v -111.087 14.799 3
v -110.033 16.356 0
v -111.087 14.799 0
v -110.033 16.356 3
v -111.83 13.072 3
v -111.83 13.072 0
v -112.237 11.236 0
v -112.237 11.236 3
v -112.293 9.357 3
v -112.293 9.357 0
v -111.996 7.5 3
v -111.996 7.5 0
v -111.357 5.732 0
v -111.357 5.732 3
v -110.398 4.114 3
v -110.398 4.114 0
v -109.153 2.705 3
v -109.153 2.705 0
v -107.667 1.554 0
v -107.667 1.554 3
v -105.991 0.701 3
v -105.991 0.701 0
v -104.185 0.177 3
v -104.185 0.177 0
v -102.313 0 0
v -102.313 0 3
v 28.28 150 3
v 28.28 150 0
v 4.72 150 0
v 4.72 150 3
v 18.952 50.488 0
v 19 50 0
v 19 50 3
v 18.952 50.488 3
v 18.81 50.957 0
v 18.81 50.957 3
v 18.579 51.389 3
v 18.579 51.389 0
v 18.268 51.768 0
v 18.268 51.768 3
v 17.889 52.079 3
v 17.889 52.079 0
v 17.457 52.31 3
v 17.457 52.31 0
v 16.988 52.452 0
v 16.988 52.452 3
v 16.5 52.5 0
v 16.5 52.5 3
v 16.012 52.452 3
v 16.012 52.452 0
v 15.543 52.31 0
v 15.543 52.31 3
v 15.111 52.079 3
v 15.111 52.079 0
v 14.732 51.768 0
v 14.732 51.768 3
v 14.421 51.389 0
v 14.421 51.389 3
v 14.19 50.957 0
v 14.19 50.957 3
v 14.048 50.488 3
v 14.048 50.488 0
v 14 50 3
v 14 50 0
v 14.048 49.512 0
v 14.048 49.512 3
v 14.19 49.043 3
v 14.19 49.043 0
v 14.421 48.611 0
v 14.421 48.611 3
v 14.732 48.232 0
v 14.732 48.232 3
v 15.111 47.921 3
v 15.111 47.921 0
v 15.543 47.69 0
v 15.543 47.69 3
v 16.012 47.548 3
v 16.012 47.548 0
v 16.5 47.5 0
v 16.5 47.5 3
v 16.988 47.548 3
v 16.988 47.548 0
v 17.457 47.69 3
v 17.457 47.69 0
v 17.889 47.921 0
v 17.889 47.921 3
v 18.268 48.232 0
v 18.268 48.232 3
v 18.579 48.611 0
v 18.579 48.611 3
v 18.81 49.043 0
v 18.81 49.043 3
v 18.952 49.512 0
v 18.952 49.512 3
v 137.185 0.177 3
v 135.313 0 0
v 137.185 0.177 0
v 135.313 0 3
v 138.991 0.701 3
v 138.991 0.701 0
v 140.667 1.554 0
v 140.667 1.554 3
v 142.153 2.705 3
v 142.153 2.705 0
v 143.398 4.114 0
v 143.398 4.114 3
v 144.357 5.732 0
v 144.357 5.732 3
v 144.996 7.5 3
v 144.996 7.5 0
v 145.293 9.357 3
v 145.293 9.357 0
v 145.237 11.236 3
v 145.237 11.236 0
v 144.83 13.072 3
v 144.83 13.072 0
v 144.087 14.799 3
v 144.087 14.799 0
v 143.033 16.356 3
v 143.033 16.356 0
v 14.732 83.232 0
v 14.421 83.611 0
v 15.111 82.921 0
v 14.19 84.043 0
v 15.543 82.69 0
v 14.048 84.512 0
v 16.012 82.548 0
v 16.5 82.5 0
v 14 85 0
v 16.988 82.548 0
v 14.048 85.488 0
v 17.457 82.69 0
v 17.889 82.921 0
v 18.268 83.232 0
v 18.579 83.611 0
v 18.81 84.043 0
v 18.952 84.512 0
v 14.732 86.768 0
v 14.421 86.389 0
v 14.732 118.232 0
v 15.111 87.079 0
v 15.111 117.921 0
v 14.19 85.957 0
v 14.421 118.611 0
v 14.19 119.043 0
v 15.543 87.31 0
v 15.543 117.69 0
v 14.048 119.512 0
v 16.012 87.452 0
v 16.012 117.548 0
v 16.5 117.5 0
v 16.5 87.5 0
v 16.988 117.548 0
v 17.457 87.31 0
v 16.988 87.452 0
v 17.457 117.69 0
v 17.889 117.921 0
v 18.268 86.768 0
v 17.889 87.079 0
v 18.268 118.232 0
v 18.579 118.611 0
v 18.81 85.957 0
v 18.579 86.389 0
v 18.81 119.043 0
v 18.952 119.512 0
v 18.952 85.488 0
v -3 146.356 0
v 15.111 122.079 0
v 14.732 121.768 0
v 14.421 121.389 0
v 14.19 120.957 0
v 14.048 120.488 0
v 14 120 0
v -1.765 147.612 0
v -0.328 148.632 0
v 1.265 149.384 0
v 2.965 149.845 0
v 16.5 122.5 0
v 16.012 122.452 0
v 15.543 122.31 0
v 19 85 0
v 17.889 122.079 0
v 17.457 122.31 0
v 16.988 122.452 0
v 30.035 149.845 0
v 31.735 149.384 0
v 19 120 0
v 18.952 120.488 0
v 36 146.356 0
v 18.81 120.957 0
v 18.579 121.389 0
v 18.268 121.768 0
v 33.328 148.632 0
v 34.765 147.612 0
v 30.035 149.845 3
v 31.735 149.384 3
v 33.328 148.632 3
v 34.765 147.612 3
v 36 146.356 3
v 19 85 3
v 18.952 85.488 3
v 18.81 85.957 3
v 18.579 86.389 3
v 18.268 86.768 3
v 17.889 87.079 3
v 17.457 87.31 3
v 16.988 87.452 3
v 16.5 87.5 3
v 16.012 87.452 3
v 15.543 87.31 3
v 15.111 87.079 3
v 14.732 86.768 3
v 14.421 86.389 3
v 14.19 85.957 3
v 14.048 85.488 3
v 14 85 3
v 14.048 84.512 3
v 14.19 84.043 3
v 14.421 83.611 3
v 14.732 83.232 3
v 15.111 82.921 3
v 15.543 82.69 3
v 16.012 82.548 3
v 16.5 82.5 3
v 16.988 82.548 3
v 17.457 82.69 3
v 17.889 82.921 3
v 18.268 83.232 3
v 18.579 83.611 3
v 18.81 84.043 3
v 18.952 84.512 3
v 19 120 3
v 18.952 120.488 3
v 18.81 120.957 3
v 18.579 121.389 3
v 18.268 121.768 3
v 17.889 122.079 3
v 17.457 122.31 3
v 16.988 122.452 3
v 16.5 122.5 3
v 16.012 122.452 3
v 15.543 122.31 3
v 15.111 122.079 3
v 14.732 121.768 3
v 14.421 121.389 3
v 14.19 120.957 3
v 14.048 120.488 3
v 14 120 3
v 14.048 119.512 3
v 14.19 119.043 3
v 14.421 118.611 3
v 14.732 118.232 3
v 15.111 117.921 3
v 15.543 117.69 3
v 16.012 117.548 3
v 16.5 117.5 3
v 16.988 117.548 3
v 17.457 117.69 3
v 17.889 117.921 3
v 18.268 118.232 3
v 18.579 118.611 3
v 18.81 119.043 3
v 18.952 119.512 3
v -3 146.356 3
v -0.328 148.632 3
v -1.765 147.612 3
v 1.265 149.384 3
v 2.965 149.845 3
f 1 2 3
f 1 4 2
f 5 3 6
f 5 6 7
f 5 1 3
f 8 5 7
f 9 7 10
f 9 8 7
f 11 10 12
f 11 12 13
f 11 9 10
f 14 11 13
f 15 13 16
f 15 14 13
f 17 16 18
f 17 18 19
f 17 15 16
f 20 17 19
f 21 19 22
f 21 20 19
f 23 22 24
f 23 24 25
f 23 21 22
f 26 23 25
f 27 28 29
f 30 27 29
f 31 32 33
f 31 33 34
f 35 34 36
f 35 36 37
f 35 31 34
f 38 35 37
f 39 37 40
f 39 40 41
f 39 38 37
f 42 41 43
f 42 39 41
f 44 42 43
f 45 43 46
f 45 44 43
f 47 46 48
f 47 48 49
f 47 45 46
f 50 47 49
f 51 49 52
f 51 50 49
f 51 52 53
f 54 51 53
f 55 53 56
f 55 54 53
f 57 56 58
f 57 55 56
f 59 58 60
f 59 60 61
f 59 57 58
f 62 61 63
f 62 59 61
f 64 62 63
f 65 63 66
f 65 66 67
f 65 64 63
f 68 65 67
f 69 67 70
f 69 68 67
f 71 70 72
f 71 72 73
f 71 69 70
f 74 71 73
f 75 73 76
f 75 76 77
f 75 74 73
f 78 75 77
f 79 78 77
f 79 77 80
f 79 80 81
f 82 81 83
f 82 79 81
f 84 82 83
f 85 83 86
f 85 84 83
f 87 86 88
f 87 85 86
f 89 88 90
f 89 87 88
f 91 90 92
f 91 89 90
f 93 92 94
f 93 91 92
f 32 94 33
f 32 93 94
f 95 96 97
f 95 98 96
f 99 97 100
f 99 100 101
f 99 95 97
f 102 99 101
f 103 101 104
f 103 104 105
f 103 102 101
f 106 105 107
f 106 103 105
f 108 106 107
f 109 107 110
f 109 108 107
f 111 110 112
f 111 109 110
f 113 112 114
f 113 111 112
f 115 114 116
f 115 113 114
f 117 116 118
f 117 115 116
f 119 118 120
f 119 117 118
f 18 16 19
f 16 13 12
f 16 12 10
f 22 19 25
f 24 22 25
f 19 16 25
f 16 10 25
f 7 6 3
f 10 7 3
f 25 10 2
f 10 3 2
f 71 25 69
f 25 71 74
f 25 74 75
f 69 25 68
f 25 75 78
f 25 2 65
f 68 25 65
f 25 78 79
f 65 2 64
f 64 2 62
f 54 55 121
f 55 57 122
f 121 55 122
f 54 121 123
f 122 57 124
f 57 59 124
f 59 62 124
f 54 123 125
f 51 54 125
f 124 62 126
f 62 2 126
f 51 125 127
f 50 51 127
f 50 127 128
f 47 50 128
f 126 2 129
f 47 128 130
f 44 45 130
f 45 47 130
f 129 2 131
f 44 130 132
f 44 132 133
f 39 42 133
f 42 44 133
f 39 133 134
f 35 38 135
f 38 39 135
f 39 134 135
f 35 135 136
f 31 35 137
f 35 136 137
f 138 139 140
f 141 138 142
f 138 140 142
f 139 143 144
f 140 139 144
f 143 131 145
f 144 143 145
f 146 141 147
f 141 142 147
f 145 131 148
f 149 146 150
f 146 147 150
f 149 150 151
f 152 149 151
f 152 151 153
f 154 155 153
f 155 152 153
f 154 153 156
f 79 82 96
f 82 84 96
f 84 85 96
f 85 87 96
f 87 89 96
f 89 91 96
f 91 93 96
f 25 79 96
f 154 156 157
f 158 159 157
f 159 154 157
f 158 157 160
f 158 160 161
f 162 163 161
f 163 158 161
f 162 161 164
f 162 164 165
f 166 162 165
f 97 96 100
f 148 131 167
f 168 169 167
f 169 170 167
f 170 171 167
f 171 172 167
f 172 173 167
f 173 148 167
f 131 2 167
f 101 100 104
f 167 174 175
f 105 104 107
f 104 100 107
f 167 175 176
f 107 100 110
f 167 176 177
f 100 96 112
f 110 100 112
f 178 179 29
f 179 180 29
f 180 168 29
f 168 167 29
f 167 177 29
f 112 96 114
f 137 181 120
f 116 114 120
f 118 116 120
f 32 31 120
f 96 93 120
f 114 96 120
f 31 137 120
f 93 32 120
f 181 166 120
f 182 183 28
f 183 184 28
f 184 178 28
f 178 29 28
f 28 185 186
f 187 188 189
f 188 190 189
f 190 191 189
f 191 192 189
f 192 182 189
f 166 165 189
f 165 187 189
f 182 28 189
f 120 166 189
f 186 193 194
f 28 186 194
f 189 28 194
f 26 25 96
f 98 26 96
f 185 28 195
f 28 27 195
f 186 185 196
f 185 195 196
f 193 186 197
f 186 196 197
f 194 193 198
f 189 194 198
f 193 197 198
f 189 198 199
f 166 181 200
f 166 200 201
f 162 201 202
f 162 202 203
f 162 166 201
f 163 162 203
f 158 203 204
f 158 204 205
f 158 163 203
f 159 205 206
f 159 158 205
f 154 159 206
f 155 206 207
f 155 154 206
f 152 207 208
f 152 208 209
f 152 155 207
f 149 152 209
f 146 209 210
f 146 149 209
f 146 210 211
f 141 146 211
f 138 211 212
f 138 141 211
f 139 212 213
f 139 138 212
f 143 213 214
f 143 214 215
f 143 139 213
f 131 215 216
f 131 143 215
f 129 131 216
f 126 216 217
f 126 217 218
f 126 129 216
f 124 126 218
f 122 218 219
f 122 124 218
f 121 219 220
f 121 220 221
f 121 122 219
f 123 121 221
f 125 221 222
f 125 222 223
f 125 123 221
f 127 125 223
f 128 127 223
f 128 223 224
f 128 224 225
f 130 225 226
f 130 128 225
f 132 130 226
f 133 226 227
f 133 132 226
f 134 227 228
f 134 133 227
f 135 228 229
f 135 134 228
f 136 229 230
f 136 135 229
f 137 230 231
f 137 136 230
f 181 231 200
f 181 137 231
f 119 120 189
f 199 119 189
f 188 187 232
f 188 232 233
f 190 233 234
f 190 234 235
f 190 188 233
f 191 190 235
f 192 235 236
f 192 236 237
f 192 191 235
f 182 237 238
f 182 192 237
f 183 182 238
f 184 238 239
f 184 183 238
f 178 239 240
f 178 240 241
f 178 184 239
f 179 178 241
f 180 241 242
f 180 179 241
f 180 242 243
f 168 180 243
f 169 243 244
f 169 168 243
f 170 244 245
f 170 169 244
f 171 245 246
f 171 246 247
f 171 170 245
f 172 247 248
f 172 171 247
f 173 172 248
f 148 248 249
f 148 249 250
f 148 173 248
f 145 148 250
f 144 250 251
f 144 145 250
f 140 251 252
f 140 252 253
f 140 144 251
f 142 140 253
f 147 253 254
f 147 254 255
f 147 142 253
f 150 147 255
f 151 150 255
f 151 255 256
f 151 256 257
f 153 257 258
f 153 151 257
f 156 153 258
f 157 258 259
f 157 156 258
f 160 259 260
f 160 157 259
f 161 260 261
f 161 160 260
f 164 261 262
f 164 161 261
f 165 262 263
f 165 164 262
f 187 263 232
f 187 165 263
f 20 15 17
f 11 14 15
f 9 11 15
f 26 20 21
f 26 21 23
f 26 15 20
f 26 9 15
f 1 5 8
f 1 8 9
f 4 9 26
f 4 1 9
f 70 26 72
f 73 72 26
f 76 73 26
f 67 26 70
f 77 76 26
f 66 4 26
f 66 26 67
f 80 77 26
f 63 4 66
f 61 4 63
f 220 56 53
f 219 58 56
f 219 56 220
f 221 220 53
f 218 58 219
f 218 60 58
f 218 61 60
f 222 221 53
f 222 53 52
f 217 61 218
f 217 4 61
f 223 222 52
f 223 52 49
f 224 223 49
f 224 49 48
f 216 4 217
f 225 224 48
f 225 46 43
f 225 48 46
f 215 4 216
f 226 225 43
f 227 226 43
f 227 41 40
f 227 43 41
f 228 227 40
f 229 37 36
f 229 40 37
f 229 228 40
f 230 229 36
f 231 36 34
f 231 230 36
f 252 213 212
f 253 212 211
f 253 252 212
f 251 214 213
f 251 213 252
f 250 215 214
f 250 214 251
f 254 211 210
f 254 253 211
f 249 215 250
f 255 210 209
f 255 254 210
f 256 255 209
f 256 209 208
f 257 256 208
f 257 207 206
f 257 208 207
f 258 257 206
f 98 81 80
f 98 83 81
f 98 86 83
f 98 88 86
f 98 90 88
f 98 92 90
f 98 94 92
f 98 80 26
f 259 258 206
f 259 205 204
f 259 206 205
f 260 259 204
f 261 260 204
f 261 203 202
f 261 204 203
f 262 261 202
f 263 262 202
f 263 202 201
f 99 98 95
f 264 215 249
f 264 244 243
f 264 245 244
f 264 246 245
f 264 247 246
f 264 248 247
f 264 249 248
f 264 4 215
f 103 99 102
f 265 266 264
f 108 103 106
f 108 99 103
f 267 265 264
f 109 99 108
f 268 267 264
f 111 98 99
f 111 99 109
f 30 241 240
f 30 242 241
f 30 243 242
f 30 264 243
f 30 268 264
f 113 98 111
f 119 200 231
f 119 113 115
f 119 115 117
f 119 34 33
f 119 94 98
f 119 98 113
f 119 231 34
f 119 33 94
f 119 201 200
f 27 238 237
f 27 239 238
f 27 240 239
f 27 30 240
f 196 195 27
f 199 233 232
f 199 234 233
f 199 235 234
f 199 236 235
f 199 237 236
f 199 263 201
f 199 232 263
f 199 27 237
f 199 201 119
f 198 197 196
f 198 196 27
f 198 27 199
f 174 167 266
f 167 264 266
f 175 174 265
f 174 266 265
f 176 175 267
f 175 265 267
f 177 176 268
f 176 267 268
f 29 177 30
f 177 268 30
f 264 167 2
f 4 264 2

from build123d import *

# Parameters (mm, degrees)
SKETCH1_R           = 2.5
BOSS_EXTRUDE1_DEPTH = 3
FILLET1_R           = 10


with BuildPart() as part:
    # Sketch1 → Boss-Extrude1 (new body)
    with BuildSketch(Plane.XY):
        Polygon((0, 150), (-123.5, 0), (0, 0), (33, 0), (156.5, 0), (33, 150), align=None)
        with Locations((16.5, 85)):
            Circle(SKETCH1_R, mode=Mode.SUBTRACT)
        with Locations((16.5, 120)):
            Circle(SKETCH1_R, mode=Mode.SUBTRACT)
        with Locations((16.5, 50)):
            Circle(SKETCH1_R, mode=Mode.SUBTRACT)
    extrude(amount=BOSS_EXTRUDE1_DEPTH)

    # Fillet1
    fillet1_edges = [part.edges().sort_by_distance(p)[0] for p in [
        (-123.5, 0, 1.5),
        (0, 150, 1.5),
        (33, 150, 1.5),
        (156.5, 0, 1.5),
    ]]
    fillet(fillet1_edges, radius=FILLET1_R)


solid = part.part
